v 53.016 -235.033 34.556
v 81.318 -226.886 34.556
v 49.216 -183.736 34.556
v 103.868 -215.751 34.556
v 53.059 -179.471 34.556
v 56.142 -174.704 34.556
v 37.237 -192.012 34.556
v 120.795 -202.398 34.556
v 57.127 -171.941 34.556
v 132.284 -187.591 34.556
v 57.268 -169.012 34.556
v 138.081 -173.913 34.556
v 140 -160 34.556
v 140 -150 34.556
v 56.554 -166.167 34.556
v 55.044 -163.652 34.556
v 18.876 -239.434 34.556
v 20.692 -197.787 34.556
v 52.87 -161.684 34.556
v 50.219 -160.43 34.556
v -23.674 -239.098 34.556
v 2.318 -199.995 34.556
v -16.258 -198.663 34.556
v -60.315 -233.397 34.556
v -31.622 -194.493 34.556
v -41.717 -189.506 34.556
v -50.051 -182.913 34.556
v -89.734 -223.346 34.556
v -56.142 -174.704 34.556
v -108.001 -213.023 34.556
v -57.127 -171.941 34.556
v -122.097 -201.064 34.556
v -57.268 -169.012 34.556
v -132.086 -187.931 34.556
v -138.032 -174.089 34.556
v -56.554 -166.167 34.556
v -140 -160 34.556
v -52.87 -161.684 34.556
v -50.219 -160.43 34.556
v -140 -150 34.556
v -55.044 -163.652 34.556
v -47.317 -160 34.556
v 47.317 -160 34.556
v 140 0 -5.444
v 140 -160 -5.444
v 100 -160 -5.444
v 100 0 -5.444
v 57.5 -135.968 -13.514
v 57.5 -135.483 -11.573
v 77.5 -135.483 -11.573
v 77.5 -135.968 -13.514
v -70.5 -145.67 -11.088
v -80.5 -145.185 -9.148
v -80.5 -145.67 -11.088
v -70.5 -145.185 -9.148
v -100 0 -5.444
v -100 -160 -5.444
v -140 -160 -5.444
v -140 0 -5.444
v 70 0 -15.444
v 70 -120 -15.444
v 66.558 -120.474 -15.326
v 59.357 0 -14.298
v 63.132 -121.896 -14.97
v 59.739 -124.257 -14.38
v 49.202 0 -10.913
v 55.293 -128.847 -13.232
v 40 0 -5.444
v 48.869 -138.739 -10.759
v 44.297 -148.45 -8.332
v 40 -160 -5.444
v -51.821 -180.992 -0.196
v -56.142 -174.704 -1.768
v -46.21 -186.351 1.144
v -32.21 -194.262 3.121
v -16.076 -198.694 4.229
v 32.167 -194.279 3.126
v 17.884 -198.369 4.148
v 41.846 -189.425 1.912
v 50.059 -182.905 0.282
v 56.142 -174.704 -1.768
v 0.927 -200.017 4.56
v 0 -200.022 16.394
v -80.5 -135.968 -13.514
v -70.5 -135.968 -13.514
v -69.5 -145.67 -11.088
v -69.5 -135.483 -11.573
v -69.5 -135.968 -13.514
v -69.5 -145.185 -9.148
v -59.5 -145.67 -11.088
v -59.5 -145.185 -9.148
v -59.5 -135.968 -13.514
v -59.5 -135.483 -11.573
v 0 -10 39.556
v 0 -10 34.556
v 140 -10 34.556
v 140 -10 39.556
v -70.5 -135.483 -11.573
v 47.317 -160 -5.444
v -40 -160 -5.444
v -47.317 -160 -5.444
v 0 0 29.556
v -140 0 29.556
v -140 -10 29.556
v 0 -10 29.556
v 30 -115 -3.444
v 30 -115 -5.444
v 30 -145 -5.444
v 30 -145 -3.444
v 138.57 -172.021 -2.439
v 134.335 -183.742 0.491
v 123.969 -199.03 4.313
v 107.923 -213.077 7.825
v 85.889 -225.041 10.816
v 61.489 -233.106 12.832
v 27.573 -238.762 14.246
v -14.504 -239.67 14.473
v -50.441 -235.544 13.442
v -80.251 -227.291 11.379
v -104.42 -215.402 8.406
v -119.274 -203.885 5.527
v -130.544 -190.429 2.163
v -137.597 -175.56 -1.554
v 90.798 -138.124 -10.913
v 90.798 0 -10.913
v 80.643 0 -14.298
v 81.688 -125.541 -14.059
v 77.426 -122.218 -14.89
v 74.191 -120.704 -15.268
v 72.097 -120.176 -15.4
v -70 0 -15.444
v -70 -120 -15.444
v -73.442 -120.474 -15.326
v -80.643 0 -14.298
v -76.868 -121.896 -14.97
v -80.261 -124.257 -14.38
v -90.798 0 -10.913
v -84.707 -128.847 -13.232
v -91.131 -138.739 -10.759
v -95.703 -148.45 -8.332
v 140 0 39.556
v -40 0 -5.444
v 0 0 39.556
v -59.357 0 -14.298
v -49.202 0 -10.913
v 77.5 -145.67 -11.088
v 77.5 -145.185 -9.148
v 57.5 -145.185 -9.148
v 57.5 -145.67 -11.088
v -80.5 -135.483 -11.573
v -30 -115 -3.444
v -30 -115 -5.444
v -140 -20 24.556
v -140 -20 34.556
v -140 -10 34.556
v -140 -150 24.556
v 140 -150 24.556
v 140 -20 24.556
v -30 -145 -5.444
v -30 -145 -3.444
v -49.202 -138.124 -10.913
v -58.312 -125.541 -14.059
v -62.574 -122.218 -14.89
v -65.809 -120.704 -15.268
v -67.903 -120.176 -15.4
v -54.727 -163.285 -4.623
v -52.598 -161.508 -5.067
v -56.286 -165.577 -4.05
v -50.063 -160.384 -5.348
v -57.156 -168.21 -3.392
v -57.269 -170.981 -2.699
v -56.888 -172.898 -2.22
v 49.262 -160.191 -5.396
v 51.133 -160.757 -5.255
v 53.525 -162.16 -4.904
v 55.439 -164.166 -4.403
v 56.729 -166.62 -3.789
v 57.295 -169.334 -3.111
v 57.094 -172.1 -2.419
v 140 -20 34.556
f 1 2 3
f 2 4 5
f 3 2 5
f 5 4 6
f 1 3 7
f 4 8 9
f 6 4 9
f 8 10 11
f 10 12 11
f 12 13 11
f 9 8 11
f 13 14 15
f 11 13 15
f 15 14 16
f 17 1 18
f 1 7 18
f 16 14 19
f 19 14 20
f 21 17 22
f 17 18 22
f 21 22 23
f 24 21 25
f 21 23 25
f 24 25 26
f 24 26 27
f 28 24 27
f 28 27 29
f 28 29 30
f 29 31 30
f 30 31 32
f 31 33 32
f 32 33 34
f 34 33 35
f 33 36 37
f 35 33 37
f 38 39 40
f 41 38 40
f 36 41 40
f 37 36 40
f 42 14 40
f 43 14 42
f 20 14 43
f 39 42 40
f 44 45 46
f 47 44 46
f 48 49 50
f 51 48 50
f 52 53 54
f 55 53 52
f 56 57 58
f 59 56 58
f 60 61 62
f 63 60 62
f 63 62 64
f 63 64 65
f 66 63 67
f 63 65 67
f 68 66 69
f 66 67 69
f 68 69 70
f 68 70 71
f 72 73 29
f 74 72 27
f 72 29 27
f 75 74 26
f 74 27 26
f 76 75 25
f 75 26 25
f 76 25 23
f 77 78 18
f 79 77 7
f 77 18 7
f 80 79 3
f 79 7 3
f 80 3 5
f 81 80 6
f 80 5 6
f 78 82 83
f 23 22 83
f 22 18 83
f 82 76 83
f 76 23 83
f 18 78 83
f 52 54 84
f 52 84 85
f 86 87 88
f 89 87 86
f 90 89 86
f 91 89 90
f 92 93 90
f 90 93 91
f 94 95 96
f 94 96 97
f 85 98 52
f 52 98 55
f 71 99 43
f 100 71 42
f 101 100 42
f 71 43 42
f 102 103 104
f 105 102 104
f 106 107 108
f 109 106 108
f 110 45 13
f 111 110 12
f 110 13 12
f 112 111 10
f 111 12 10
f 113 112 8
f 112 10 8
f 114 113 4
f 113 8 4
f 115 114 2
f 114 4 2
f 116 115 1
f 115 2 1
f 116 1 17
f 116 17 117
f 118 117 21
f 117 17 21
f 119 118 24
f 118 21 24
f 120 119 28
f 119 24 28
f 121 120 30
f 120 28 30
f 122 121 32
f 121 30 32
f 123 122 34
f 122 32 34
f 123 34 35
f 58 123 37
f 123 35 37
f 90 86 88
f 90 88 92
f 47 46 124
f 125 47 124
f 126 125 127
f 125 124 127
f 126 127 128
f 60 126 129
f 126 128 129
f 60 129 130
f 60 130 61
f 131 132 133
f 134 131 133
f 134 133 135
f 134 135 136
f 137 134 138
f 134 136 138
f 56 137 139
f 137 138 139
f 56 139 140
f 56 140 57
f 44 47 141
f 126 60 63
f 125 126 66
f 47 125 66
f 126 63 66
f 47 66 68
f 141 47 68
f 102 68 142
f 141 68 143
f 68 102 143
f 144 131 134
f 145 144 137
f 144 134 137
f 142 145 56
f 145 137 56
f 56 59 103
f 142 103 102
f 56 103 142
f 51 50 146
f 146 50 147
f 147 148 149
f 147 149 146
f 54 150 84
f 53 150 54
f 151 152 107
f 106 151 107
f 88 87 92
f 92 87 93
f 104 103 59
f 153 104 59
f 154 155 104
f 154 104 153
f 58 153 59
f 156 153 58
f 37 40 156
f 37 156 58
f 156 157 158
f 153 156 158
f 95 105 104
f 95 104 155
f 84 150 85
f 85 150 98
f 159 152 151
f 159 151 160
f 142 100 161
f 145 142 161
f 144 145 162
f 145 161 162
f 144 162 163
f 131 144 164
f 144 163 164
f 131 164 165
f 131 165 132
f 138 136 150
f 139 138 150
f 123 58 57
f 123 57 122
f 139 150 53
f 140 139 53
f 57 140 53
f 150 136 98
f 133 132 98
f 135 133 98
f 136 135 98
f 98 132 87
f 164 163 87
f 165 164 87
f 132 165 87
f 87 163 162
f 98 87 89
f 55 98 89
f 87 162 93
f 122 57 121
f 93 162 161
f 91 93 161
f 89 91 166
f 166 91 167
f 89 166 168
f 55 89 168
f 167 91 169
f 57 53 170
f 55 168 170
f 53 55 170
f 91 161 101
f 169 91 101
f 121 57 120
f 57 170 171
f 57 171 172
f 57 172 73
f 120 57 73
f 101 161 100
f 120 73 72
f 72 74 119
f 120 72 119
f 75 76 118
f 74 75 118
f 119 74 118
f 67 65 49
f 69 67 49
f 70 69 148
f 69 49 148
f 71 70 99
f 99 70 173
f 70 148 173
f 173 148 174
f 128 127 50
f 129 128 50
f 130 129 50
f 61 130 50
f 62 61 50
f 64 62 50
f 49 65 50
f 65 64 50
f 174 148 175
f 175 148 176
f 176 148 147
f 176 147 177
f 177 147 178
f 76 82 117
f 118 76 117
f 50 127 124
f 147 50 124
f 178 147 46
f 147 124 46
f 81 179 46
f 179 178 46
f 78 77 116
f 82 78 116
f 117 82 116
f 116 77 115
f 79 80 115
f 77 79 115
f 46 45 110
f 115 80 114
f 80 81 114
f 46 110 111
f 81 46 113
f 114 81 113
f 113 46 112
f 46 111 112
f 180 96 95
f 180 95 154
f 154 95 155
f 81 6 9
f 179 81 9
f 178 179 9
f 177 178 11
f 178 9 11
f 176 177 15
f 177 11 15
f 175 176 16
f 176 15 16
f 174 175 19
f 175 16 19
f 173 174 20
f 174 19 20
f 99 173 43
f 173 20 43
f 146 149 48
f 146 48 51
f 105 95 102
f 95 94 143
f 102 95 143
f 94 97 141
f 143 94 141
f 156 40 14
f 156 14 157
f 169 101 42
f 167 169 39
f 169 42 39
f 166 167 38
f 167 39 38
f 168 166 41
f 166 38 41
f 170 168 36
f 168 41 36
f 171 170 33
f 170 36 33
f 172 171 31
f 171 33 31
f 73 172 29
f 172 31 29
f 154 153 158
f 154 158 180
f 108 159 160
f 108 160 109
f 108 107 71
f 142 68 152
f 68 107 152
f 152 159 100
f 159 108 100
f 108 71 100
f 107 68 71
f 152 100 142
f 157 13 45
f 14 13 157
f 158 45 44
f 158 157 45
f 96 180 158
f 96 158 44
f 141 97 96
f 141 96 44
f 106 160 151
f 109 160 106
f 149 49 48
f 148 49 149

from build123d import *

# Parameters (mm, degrees)
F1_DEPTH  = 240
F5_DEPTH  = 55
F6_DEPTH  = 300
F7_DEPTH  = 300
F9_DEPTH  = 60
F11_DEPTH = 300
F12_W     = 10
F12_H     = 10
F13_DEPTH = 140
F14_W     = 10
F14_H     = 5
F15_DEPTH = 140
F16_W     = 10
F16_H     = 5
F17_DEPTH = 140
F18_W     = 60
F18_H     = 30
F19_DEPTH = 2
F20_W     = 10
F20_H     = 10
F20_W_2   = 20
F21_DEPTH = 2


with BuildPart() as f1:
    # F0 (on Front) → F1 (new body)
    with BuildSketch(Plane.XZ):
        Polygon((140, 34.5558735134), (0, 34.5558735134), (-140, 34.5558735134), (-140, -15.4441264866), (0, -15.4441264866), (140, -15.4441264866), align=None)
    extrude(amount=F1_DEPTH)

    # F2 (on face) → F5 (cut)
    with BuildSketch(Plane.XY.offset(34.5558735134)):
        with BuildLine():
            add(Edge.make_bspline(
                [(0, -240), (95.3545197845, -240), (140, -198.7661118304), (140, -160)],
                knots=[0, 0, 0, 0, 161.245154966, 161.245154966, 161.245154966, 161.245154966], degree=3))
            add(Edge.make_bspline(
                [(0, -240), (-95.3545197845, -240), (-140, -198.7661118304), (-140, -160)],
                knots=[0, 0, 0, 0, 161.245154966, 161.245154966, 161.245154966, 161.245154966], degree=3))
            Line((-140, -160), (-197.980850935, -160))
            Line((-197.980850935, -160), (-197.980850935, -279.9530625343))
            Line((-197.980850935, -279.9530625343), (0, -279.9530625343))
            Line((0, -279.9530625343), (197.980850935, -279.9530625343))
            Line((197.980850935, -279.9530625343), (197.980850935, -160))
            Line((197.980850935, -160), (140, -160))
        make_face()
    extrude(amount=-F5_DEPTH, mode=Mode.SUBTRACT)

    # F3 (on face) → F6 (cut)
    with BuildSketch(Plane.YZ.offset(140)):
        Polygon((-160, -5.4441264866), (-240, 14.5558735134), (-258.7273418903, 14.5558735134), (-258.7273418903, -38.2786095142), (-129.8724895716, -38.2786095142), (-120, -15.4441264866), align=None)
    extrude(amount=-F6_DEPTH, mode=Mode.SUBTRACT)

    # F4 (on face) → F7 (cut)
    with BuildSketch(Plane.XZ.offset(240)):
        with BuildLine():
            Line((-100, -5.4441264866), (-140, -5.4441264866))
            Line((-140, -5.4441264866), (-165.9448444843, -5.4441264866))
            Line((-165.9448444843, -5.4441264866), (-165.9448444843, -57.6582395507))
            Line((-165.9448444843, -57.6582395507), (0, -57.6582395507))
            Line((0, -57.6582395507), (165.9448444843, -57.6582395507))
            Line((165.9448444843, -57.6582395507), (165.9448444843, -5.4441264866))
            Line((165.9448444843, -5.4441264866), (140, -5.4441264866))
            Line((140, -5.4441264866), (100, -5.4441264866))
            ThreePointArc((100, -5.4441264866), (85.8113883008, -12.8782913891), (70, -15.4441264866))
            ThreePointArc((70, -15.4441264866), (54.1886116992, -12.8782913891), (40, -5.4441264866))
            Line((40, -5.4441264866), (0, -5.4441264866))
            Line((0, -5.4441264866), (-40, -5.4441264866))
            ThreePointArc((-40, -5.4441264866), (-54.1886116992, -12.8782913891), (-70, -15.4441264866))
            ThreePointArc((-70, -15.4441264866), (-85.8113883008, -12.8782913891), (-100, -5.4441264866))
        make_face()
    extrude(amount=-F7_DEPTH, mode=Mode.SUBTRACT)

    # F8 (on face) → F9 (cut)
    with BuildSketch(Plane.XY.offset(34.5558735134)):
        with BuildLine():
            Line((0, -160), (-47.3172063291, -160))
            ThreePointArc((-47.3172063291, -160), (-55.8915722063, -164.8541035957), (-56.1417660364, -174.7039500392))
            add(Edge.make_bspline(
                [(-56.1417660364, -174.7039500392), (-47.0895211735, -191.6858640929), (-23.5447605868, -200.0218033791), (0, -200.0218033791)],
                knots=[14.6694859707, 14.6694859707, 14.6694859707, 14.6694859707, 72.1231221295, 72.1231221295, 72.1231221295, 72.1231221295], degree=3))
            add(Edge.make_bspline(
                [(56.1417660364, -174.7039500392), (47.0895211735, -191.6858640929), (23.5447605868, -200.0218033791), (0, -200.0218033791)],
                knots=[14.6694859707, 14.6694859707, 14.6694859707, 14.6694859707, 72.1231221295, 72.1231221295, 72.1231221295, 72.1231221295], degree=3))
            ThreePointArc((56.1417660364, -174.7039500392), (55.8915722063, -164.8541035957), (47.3172063291, -160))
            Line((47.3172063291, -160), (0, -160))
        make_face()
    extrude(amount=-F9_DEPTH, mode=Mode.SUBTRACT)

    # F10 (on face) → F11 (cut)
    with BuildSketch(Plane.YZ.offset(140)):
        Polygon((-150, 61.0395711066), (-150, 34.5558735134), (-150, 24.5558735134), (-20, 24.5558735134), (-20, 34.5558735134), (-20, 61.0395711066), align=None)
    extrude(amount=-F11_DEPTH, mode=Mode.SUBTRACT)

    # F12 (on face) → F13 (cut)
    with BuildSketch(Plane(origin=(-140, 0, 0), x_dir=(0, -1, 0), z_dir=(-1, 0, 0))):
        with Locations((5, 29.5558735134)):
            Rectangle(F12_W, F12_H)
    extrude(amount=-F13_DEPTH, mode=Mode.SUBTRACT)

    # F14 (on face) → F15 (join)
    with BuildSketch(Plane.YZ.offset(140)):
        with Locations((-5, 37.0558735134)):
            Rectangle(F14_W, F14_H)
    extrude(amount=-F15_DEPTH)

    # F16 (on face) → F17 (join)
    with BuildSketch(Plane(origin=(-140, 0, 0), x_dir=(0, -1, 0), z_dir=(-1, 0, 0))):
        with Locations((5, 27.0558735134)):
            Rectangle(F16_W, F16_H)
    extrude(amount=-F17_DEPTH)

    # F18 (on face) → F19 (cut)
    with BuildSketch(Plane(origin=(0, 0, -5.4441264866), x_dir=(1, 0, 0), z_dir=(0, 0, -1))):
        with Locations((0, 130)):
            Rectangle(F18_W, F18_H)
    extrude(amount=-F19_DEPTH, mode=Mode.SUBTRACT)

    # F20 (on face) → F21 (join)
    with BuildSketch(Plane(origin=(0, -10.6927356439, -42.7709425756), x_dir=(1, 0, 0), z_dir=(0, -0.242535625, -0.9701425001))):
        with Locations((-75.5, 133.6312378254)):
            Rectangle(F20_W, F20_H)
        with Locations((-64.5, 133.6312378254)):
            Rectangle(F20_W, F20_H)
        with Locations((67.5, 133.6312378254)):
            Rectangle(F20_W_2, F20_H)
    extrude(amount=F21_DEPTH)


solid = f1.part
